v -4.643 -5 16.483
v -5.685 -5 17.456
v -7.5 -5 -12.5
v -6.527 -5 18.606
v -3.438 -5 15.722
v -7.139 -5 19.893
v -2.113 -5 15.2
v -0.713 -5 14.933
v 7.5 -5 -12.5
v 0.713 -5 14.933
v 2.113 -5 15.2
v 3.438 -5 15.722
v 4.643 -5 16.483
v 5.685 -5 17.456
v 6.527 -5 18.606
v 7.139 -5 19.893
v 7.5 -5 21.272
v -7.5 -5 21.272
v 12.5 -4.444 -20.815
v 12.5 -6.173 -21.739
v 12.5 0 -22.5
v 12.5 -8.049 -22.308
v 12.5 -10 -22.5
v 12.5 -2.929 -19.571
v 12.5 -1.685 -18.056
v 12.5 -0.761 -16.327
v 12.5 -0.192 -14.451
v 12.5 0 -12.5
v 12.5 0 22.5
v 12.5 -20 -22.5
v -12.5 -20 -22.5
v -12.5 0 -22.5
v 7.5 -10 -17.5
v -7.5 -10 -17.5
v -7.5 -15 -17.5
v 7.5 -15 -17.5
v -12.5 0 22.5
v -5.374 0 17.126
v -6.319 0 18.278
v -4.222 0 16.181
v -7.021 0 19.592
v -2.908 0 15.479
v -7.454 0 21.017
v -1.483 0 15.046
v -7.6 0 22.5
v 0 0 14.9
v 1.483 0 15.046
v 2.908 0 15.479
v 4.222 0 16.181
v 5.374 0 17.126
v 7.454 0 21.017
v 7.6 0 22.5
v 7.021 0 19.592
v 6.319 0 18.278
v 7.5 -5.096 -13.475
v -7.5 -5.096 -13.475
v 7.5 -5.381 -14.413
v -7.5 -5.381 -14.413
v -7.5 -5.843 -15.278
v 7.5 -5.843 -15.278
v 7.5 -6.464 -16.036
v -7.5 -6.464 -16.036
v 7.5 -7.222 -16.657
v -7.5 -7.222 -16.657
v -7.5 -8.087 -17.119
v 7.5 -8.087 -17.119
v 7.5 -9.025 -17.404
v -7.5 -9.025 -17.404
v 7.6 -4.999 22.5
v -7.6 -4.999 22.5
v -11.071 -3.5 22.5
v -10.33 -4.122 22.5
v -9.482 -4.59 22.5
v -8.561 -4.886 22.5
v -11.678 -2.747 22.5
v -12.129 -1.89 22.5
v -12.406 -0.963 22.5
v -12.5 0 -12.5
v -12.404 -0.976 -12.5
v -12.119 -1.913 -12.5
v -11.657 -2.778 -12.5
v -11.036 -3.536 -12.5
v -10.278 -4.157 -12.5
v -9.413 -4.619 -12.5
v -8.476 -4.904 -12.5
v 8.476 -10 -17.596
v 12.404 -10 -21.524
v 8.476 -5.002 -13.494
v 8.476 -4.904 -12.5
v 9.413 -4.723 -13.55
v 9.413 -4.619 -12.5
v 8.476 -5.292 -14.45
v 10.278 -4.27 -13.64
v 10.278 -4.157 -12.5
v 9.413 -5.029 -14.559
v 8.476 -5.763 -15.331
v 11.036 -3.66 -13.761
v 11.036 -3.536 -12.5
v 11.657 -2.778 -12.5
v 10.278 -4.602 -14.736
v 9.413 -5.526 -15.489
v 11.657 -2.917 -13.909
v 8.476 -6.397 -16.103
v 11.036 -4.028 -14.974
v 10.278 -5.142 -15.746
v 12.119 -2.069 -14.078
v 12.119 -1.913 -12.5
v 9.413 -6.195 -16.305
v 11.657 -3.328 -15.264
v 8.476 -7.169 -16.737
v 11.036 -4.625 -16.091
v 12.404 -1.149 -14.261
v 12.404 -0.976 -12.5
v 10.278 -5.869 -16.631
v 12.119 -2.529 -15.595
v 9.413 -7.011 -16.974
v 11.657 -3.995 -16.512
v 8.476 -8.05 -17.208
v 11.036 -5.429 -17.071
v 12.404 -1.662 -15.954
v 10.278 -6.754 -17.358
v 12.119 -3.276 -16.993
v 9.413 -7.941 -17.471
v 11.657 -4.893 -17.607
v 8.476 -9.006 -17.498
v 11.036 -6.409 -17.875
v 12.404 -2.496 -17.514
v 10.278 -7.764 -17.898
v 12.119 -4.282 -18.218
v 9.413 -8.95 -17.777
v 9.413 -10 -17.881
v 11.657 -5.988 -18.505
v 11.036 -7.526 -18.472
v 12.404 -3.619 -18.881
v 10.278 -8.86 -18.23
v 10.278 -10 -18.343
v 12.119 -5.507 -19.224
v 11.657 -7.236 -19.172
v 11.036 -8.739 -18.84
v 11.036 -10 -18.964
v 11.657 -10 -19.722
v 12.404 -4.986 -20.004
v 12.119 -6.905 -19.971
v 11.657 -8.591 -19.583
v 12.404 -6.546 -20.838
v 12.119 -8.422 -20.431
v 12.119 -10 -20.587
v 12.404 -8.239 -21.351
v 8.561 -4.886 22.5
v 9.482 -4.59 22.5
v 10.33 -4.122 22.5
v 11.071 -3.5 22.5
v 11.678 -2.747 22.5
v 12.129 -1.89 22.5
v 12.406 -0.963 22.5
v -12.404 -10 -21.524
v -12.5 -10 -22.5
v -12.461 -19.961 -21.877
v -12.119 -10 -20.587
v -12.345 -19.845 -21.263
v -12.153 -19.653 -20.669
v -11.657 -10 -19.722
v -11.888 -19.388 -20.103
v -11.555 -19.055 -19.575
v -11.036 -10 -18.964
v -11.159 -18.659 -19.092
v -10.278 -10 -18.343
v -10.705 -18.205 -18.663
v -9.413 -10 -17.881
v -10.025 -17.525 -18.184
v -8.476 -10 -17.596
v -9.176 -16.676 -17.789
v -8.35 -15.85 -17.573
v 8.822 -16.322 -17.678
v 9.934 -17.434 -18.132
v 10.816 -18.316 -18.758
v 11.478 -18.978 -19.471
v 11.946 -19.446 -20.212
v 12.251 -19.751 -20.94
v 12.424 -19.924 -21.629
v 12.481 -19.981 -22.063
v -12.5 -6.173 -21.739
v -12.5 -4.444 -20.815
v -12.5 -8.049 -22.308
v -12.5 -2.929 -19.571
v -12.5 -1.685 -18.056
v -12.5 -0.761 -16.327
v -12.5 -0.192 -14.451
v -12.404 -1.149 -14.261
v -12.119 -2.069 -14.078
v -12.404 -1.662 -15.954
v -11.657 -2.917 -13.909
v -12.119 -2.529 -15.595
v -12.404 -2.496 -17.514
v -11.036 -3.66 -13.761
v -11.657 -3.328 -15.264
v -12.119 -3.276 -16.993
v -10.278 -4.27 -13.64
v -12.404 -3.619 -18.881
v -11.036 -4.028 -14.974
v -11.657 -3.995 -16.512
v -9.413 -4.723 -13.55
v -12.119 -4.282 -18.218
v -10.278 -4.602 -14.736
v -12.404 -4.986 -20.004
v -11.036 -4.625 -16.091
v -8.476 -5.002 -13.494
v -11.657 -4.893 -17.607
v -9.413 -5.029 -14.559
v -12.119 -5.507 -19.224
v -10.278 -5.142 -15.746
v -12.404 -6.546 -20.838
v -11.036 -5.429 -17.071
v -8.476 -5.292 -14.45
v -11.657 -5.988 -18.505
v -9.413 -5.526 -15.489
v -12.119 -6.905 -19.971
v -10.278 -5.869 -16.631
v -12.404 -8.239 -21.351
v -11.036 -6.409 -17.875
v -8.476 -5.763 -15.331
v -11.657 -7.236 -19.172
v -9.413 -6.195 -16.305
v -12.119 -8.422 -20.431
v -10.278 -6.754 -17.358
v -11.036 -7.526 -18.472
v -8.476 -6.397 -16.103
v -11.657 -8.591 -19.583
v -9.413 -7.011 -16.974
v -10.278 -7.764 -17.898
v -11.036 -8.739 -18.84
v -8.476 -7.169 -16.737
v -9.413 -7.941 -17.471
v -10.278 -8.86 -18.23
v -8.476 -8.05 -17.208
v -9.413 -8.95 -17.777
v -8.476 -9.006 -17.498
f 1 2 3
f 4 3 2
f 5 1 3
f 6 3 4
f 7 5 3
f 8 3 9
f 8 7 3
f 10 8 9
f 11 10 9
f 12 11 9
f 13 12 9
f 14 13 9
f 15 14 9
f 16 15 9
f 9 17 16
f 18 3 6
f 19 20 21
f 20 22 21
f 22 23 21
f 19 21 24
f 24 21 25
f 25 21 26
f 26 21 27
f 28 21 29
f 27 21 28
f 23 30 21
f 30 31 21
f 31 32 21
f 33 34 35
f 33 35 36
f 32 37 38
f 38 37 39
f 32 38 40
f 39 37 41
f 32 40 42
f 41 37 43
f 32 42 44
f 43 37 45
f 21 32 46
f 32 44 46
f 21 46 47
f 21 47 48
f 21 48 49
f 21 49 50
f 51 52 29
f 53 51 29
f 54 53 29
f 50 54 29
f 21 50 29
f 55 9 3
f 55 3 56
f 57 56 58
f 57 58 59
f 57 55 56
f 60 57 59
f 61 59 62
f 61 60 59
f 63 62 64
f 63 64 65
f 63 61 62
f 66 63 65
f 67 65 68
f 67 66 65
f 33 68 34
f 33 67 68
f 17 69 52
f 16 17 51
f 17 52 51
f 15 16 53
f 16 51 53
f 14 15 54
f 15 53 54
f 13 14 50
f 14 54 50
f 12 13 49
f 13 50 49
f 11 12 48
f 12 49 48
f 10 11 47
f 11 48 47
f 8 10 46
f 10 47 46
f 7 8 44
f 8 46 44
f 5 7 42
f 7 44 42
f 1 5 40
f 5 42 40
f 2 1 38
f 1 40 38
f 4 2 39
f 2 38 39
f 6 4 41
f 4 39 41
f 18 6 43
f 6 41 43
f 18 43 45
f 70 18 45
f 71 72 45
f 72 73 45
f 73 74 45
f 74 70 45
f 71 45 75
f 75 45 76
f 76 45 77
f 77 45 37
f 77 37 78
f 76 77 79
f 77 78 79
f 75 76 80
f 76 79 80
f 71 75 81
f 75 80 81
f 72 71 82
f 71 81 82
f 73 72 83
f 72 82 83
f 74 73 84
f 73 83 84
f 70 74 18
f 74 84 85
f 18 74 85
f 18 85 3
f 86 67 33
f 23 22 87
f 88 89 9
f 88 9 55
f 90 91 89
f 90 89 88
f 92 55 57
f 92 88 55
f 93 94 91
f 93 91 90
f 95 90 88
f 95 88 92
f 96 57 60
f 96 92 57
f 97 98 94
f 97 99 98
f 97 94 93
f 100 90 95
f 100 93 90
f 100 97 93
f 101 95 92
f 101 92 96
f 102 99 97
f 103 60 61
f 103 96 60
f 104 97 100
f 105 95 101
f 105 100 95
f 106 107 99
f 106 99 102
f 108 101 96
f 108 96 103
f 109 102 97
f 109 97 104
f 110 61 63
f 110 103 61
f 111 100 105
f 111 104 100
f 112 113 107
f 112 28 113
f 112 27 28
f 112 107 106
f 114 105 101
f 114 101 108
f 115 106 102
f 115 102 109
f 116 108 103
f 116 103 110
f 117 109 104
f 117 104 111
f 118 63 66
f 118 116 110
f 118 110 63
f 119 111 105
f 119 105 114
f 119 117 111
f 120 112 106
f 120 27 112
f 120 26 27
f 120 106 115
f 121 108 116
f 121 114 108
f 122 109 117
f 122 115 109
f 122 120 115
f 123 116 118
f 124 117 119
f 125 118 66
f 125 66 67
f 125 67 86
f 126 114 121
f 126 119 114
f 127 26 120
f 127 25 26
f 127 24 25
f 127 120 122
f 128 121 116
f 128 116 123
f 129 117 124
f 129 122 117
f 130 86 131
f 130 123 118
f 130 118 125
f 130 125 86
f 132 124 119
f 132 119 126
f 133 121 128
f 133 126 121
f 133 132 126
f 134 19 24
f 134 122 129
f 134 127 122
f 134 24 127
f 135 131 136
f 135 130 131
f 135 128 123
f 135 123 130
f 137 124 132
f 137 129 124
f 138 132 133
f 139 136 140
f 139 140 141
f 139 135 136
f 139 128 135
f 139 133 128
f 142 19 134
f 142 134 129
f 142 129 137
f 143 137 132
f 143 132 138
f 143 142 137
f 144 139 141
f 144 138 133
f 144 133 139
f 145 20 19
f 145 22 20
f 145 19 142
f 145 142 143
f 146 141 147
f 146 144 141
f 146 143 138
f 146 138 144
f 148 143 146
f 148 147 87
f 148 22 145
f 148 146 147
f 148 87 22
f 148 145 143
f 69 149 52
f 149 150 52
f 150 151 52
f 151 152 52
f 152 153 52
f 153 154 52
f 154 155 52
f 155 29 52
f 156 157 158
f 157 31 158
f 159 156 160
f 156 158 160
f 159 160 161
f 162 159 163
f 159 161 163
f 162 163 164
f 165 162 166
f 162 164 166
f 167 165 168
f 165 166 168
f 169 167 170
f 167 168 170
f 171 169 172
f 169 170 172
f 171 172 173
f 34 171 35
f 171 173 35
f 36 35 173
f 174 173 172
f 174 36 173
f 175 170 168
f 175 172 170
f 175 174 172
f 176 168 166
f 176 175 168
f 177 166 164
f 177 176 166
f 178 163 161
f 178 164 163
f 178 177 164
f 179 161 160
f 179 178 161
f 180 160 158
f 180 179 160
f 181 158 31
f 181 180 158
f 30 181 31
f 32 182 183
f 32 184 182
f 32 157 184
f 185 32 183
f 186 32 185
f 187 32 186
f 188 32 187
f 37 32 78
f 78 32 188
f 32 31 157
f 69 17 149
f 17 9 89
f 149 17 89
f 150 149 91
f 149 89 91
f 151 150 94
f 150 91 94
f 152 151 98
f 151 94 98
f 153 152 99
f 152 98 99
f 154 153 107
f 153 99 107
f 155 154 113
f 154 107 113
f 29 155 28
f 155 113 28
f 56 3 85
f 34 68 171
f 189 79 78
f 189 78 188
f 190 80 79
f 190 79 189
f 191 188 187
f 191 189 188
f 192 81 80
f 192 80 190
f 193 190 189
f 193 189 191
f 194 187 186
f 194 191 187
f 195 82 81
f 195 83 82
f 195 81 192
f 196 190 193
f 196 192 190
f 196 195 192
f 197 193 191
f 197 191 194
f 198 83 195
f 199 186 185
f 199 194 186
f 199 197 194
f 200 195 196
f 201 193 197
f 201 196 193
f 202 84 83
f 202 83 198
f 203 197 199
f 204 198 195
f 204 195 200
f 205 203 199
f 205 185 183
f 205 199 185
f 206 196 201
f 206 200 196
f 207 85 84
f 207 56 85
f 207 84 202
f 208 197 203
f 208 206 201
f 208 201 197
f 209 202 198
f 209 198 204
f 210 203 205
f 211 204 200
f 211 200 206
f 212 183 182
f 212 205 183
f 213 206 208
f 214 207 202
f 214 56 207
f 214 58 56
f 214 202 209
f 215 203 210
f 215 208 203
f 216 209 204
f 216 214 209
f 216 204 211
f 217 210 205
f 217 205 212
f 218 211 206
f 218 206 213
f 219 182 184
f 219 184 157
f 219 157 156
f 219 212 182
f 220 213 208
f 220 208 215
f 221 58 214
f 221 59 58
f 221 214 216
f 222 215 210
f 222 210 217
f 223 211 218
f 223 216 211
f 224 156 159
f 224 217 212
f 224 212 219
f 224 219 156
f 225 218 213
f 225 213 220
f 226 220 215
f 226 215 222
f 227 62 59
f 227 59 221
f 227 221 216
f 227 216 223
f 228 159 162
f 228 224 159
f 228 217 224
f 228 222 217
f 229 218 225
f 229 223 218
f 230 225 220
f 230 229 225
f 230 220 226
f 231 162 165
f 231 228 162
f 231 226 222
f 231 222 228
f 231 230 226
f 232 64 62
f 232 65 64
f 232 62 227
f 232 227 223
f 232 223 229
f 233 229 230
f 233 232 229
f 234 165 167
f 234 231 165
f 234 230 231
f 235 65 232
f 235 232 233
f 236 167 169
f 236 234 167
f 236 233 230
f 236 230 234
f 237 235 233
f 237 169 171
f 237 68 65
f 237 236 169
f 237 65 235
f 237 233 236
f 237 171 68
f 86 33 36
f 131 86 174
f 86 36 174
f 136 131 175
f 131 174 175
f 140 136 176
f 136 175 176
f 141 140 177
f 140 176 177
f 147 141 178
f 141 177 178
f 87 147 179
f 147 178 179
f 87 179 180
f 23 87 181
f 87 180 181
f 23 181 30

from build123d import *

# Parameters (mm, degrees)
F1_DEPTH = 5
F2_W     = 25
F2_H     = 5
F3_DEPTH = 15
F4_F1_R  = 5
F4_F2_R  = 4.9999


# Not quite as in the source:
# - a fillet or chamfer is up to 0.001 mm smaller than in the source, because OpenCascade refuses the exact size


with BuildPart() as f1:
    # F0 (on Front) → F1 (new body)
    with BuildSketch(Plane.XZ):
        with BuildLine():
            Line((-12.5, -22.5), (12.5, -22.5))
            Line((12.5, -22.5), (12.5, 22.5))
            Line((12.5, 22.5), (7.6, 22.5))
            ThreePointArc((7.6, 22.5), (0, 14.9), (-7.6, 22.5))
            Line((-7.6, 22.5), (-12.5, 22.5))
            Line((-12.5, 22.5), (-12.5, -22.5))
        make_face()
    extrude(amount=F1_DEPTH)

    # F2 (on face) → F3 (join)
    with BuildSketch(Plane.XZ.offset(5)):
        with Locations((0, -20)):
            Rectangle(F2_W, F2_H)
    extrude(amount=F3_DEPTH)

    # F4: fillet of radius 5 on 4 edges, made by hand

    # F4_f1
    f4_f1_edges = [f1.edges().sort_by_distance(p)[0] for p in [
        (0, -5, -17.5),
    ]]
    fillet(f4_f1_edges, radius=F4_F1_R)

    # F4_f2 (radius 5 in the source; OpenCascade refuses exactly that, so slightly less here)
    f4_f2_edges = [f1.edges().sort_by_distance(p)[0] for p in [
        (12.5, -15, -17.5),
        (-12.5, -15, -17.5),
        (0, -20, -17.5),
        (-12.5, -6.4644660941, -16.0355339059),
        (12.5, -6.4644660941, -16.0355339059),
    ]]
    fillet(f4_f2_edges, radius=F4_F2_R)


solid = f1.part
